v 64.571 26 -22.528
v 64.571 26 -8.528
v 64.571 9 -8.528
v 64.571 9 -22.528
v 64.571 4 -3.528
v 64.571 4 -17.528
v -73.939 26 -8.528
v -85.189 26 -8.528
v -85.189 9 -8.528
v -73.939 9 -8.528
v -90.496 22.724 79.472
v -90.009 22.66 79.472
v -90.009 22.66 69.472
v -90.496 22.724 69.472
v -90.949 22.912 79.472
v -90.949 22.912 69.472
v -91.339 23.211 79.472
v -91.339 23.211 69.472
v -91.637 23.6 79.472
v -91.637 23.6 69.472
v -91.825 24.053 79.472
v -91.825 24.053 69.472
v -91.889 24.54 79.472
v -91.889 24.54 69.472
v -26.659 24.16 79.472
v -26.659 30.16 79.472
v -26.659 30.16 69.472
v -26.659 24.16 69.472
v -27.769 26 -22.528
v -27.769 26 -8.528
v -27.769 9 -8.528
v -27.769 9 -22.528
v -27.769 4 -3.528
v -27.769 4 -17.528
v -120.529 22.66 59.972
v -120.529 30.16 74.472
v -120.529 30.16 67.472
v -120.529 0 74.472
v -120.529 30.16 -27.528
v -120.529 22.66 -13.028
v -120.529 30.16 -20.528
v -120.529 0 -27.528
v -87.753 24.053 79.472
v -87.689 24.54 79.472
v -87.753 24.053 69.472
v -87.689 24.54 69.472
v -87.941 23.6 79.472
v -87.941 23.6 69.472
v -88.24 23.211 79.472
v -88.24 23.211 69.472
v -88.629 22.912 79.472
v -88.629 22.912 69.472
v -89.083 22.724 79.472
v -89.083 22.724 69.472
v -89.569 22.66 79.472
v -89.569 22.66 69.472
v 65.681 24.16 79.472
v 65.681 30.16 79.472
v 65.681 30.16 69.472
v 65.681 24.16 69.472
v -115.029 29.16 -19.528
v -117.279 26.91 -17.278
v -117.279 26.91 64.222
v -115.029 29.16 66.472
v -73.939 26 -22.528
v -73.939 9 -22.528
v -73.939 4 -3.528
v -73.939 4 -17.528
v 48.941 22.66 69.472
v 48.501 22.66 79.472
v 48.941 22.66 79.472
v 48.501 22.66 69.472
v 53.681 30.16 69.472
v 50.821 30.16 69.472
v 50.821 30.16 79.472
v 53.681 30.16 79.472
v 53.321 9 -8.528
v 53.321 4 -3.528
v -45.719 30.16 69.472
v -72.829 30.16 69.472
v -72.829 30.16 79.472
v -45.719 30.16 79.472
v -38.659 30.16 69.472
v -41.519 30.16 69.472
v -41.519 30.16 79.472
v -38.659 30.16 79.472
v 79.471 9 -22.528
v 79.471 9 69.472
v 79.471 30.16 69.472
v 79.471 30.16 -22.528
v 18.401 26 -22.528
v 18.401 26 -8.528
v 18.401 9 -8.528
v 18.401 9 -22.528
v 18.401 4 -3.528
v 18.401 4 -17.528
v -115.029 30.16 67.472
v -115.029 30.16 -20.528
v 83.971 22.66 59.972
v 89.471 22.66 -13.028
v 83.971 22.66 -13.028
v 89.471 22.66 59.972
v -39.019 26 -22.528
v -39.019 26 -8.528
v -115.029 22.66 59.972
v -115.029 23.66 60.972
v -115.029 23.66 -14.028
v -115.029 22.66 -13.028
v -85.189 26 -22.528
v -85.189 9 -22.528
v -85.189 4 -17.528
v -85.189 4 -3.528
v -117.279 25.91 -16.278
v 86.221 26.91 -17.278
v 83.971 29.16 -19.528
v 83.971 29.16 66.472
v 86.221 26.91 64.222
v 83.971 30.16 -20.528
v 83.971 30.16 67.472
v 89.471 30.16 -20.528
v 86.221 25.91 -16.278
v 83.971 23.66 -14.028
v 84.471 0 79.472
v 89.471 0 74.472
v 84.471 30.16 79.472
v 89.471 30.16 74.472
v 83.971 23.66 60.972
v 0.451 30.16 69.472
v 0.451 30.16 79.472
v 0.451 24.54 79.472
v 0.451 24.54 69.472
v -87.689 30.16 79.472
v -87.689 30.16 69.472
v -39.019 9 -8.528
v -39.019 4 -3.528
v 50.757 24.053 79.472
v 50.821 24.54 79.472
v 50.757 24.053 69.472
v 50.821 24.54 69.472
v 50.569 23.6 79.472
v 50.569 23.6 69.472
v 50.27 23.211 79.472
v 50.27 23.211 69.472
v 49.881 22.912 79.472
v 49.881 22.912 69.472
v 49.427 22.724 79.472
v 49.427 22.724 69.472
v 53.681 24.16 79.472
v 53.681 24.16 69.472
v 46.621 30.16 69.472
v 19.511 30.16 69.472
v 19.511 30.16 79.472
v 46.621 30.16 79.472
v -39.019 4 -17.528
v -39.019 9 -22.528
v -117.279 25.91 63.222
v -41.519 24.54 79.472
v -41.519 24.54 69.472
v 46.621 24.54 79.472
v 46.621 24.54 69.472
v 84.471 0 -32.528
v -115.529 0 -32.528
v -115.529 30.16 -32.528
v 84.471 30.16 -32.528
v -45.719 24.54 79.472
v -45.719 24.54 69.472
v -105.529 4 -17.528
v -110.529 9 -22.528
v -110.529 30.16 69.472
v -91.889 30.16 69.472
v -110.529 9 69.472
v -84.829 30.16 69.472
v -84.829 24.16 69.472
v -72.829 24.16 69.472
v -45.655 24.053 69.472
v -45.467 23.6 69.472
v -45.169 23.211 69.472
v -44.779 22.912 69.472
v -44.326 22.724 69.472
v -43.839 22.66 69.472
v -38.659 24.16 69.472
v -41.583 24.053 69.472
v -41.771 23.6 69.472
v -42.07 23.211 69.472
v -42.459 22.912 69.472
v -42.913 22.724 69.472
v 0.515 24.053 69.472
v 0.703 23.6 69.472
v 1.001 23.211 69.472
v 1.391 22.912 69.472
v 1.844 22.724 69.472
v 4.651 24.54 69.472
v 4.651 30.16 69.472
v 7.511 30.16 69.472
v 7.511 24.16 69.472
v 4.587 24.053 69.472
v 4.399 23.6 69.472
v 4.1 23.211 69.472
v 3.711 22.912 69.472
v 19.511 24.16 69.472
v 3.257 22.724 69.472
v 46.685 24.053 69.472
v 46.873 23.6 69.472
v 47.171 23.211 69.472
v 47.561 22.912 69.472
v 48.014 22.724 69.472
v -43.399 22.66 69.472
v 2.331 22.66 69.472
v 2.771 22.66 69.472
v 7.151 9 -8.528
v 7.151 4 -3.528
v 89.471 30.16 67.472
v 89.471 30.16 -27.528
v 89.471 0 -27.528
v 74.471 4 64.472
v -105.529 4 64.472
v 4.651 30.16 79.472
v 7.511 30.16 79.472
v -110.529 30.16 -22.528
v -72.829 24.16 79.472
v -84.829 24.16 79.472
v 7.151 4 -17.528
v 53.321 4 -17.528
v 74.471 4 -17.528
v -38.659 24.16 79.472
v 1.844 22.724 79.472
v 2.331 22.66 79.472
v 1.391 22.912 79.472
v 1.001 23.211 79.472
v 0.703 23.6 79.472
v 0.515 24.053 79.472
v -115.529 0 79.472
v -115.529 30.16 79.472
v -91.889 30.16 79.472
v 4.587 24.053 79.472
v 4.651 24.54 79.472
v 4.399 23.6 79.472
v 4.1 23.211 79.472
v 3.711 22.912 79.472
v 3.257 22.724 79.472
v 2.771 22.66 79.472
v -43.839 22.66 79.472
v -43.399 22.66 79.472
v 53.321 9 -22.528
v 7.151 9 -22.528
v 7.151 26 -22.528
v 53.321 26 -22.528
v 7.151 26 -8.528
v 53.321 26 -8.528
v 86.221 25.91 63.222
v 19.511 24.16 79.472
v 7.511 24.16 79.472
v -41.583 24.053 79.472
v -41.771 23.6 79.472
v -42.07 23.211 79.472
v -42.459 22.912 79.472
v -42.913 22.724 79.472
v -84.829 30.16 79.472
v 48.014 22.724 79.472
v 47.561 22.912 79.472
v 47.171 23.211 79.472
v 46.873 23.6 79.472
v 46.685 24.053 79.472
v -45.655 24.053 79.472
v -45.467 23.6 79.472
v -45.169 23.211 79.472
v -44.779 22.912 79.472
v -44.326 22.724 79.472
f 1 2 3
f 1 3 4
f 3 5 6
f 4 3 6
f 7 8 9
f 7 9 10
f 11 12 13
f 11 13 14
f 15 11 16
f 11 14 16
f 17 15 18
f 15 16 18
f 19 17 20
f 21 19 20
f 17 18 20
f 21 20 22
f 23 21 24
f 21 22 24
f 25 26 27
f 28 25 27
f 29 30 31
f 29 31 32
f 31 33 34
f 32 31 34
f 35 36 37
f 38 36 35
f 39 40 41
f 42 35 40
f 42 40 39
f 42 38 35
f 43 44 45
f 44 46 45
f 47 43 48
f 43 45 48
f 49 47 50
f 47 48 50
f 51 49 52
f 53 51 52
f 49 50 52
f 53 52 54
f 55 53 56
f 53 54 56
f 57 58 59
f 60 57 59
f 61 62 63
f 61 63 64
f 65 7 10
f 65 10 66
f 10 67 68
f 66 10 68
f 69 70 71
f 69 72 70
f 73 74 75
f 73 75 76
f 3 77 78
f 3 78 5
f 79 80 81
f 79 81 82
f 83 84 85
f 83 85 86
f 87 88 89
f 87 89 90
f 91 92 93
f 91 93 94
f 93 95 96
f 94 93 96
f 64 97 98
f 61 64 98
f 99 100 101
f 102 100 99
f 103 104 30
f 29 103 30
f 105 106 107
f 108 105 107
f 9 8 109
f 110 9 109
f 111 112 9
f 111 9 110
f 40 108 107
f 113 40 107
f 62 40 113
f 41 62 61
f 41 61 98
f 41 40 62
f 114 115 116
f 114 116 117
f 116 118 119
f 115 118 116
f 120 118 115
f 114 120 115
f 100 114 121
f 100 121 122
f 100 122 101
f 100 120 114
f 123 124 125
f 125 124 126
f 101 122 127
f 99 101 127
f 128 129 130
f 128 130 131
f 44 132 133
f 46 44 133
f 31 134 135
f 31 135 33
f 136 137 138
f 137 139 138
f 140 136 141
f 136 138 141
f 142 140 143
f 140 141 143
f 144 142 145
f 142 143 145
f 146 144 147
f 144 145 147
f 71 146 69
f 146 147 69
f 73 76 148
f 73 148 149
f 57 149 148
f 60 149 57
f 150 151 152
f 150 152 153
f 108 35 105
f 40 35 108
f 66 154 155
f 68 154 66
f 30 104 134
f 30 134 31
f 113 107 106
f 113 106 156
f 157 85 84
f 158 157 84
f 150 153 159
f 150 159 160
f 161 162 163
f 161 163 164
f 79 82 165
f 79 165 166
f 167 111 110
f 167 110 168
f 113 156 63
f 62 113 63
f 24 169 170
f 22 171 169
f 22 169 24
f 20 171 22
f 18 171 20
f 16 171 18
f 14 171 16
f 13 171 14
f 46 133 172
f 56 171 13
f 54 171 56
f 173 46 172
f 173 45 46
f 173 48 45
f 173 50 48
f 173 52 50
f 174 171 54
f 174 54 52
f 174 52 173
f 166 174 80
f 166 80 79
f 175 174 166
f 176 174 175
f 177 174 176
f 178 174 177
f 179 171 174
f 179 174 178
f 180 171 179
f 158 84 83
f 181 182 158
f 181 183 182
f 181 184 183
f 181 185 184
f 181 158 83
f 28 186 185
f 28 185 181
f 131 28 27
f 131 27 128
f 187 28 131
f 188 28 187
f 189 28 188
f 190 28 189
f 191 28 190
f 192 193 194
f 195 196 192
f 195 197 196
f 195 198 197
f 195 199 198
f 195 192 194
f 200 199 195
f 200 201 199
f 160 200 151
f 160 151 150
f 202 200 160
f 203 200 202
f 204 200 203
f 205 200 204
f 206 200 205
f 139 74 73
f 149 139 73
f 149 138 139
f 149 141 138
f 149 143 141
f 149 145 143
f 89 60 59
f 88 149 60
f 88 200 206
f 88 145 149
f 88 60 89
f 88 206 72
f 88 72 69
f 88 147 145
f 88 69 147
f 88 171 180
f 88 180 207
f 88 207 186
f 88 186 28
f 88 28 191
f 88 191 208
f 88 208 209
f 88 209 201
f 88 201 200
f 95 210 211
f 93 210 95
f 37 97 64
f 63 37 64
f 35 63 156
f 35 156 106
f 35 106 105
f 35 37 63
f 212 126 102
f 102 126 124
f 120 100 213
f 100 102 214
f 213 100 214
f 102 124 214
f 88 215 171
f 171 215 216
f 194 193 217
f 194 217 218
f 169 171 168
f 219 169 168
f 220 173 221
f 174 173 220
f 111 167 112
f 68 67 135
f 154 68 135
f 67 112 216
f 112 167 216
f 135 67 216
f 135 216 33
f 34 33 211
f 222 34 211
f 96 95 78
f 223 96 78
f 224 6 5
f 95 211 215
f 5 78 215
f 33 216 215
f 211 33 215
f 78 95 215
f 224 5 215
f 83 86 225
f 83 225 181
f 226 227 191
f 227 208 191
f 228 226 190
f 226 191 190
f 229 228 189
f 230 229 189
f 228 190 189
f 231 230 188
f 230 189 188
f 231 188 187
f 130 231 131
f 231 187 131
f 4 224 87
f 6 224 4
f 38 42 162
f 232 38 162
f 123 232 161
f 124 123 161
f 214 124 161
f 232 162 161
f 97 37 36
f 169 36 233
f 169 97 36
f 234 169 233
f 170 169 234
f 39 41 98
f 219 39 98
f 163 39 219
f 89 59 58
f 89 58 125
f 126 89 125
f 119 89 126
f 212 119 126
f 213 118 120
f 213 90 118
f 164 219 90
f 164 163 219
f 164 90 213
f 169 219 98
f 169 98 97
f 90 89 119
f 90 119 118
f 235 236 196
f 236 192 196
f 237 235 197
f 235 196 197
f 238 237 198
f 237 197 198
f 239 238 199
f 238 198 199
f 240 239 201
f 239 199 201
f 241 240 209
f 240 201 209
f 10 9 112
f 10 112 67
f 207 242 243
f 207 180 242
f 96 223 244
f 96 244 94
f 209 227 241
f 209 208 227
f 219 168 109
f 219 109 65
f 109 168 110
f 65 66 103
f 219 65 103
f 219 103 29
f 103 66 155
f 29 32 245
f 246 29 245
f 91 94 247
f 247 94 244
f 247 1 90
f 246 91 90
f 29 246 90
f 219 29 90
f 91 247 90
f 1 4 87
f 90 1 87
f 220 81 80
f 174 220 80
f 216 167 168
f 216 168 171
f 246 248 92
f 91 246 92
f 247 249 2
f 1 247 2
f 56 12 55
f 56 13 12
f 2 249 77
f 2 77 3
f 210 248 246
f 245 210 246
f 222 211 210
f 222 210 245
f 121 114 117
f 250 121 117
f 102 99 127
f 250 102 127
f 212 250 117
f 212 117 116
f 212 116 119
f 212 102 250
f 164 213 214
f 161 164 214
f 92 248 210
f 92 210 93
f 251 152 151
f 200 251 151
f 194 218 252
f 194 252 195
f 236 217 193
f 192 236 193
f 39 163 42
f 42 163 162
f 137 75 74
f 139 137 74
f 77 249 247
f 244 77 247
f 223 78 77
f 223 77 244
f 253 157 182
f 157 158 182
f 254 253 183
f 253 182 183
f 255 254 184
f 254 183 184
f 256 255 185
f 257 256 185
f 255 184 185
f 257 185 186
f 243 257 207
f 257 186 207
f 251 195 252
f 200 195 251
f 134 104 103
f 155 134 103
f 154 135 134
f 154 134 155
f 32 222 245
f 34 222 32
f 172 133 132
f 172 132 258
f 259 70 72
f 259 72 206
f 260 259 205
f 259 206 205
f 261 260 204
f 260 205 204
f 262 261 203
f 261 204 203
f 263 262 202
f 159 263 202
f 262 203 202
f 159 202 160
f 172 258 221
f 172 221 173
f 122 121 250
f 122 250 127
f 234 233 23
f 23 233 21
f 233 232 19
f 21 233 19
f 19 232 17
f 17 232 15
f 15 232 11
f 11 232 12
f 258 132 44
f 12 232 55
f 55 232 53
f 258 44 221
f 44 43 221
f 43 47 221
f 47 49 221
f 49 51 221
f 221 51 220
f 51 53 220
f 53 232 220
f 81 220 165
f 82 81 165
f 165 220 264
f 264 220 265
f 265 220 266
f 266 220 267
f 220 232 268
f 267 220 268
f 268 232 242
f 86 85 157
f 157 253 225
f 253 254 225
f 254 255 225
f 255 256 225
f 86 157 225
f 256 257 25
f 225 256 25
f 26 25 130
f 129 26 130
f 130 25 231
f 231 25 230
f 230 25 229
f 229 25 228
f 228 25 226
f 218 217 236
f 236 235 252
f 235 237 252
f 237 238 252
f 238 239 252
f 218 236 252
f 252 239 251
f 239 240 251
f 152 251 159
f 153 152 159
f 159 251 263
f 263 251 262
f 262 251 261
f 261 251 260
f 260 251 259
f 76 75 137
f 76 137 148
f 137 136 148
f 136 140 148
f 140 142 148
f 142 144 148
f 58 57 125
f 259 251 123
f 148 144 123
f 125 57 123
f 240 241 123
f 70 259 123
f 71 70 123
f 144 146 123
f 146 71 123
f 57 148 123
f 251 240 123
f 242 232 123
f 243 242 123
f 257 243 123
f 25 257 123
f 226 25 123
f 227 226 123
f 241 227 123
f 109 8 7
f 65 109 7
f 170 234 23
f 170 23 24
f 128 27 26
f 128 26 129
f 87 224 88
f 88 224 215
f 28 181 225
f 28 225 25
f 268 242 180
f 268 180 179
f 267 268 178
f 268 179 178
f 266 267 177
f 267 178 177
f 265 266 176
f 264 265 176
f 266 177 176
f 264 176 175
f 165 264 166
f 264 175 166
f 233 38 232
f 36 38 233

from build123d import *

# Parameters (mm, degrees)
SKETCH2_W           = 210
SKETCH2_H           = 112
SKETCH2_W_2         = 190
SKETCH2_H_2         = 92
BOSS_EXTRUDE1_DEPTH = 30.16
SKETCH3_W           = 210
SKETCH3_H           = 112
BOSS_EXTRUDE2_DEPTH = 4
SKETCH4_W           = 11.25
SKETCH4_H           = 13.999999996
BOSS_EXTRUDE3_DEPTH = 22
SKETCH5_W           = 12
SKETCH5_H           = 10
CUT_EXTRUDE1_DEPTH  = 6
CHAMFER2_SIZE       = 5
CUT_EXTRUDE2_DEPTH  = 5.5
CUT_EXTRUDE3_DEPTH  = 5.5
SKETCH9_W           = 4.2
SKETCH9_H           = 10
CUT_EXTRUDE4_DEPTH  = 7.5
FILLET1_R           = 1.88
CHAMFER3_SIZE       = 5
CHAMFER4_SIZE       = 5
BOSS_EXTRUDE4_START = -10
BOSS_EXTRUDE4_DEPTH = 90


with BuildPart() as part:
    # Sketch2 → Boss-Extrude1 (new body)
    with BuildSketch(Plane(origin=(0, 0, 0), x_dir=(1, 0, 0), z_dir=(0, 1, 0))):
        with Locations((-15.529354961, -23.471700962)):
            Rectangle(SKETCH2_W, SKETCH2_H)
        with Locations((-15.529354961, -23.471700962)):
            Rectangle(SKETCH2_W_2, SKETCH2_H_2, mode=Mode.SUBTRACT)
    extrude(amount=BOSS_EXTRUDE1_DEPTH)



with BuildPart() as body_2:
    # Sketch3 → Boss-Extrude2 (new body)
    with BuildSketch(Plane.XZ):
        with Locations((-15.529354961, 23.471700962)):
            Rectangle(SKETCH3_W, SKETCH3_H)
    extrude(amount=-BOSS_EXTRUDE2_DEPTH)


with BuildPart() as part_1:
    add(part.part)

    add(body_2.part)  # Boss-Extrude3 merges body 2
    # Sketch4 → Boss-Extrude3 (add)
    with BuildSketch(Plane(origin=(0, 4, 0), x_dir=(1, 0, 0), z_dir=(0, 1, 0))):
        with Locations((-79.564354961, 15.52829904)):
            Rectangle(SKETCH4_W, SKETCH4_H)
        with Locations((-33.394354961, 15.52829904)):
            Rectangle(SKETCH4_W, SKETCH4_H)
        with Locations((12.775645039, 15.52829904)):
            Rectangle(SKETCH4_W, SKETCH4_H)
        with Locations((58.945645039, 15.52829904)):
            Rectangle(SKETCH4_W, SKETCH4_H)
    extrude(amount=BOSS_EXTRUDE3_DEPTH)

    # Sketch5 → Cut-Extrude1 (cut)
    with BuildSketch(Plane(origin=(0, 30.16, 0), x_dir=(1, 0, 0), z_dir=(0, 1, 0))):
        with Locations((-78.829354961, -74.471700962)):
            Rectangle(SKETCH5_W, SKETCH5_H)
        with Locations((-32.659354961, -74.471700962)):
            Rectangle(SKETCH5_W, SKETCH5_H)
        with Locations((13.510645039, -74.471700962)):
            Rectangle(SKETCH5_W, SKETCH5_H)
        with Locations((59.680645039, -74.471700962)):
            Rectangle(SKETCH5_W, SKETCH5_H)
    extrude(amount=-CUT_EXTRUDE1_DEPTH, mode=Mode.SUBTRACT)

    # Chamfer2
    chamfer2_edges = [part_1.edges().sort_by_distance(p)[0] for p in [
        (-110.529354961, 4, 23.471700962),
        (-97.859354961, 4, -22.528299038),
        (-56.479354961, 4, -22.528299038),
        (79.470645039, 4, 23.471700962),
        (-15.529354961, 4, 69.471700962),
        (-10.309354961, 4, -22.528299038),
        (35.860645039, 4, -22.528299038),
        (72.020645039, 4, -22.528299038),
    ]]
    chamfer(chamfer2_edges, length=CHAMFER2_SIZE)

    # Sketch6 → Cut-Extrude2 (cut)
    with BuildSketch(Plane.ZY.offset(120.529354961)):
        Polygon((-20.528299038, 30.16), (67.471700962, 30.16), (59.971700962, 22.66), (-13.028299038, 22.66), align=None)
    extrude(amount=-CUT_EXTRUDE2_DEPTH, mode=Mode.SUBTRACT)

    # Sketch8 → Cut-Extrude3 (cut)
    with BuildSketch(Plane(origin=(89.470645039, 0, 0), x_dir=(0, 0, -1), z_dir=(1, 0, 0))):
        Polygon((20.528299038, 30.16), (13.028299038, 22.66), (-59.971700962, 22.66), (-67.471700962, 30.16), align=None)
    extrude(amount=-CUT_EXTRUDE3_DEPTH, mode=Mode.SUBTRACT)

    # Sketch9 → Cut-Extrude4 (cut)
    with BuildSketch(Plane(origin=(0, 30.16, 0), x_dir=(1, 0, 0), z_dir=(0, 1, 0))):
        with Locations((-89.789354961, -74.471700962)):
            Rectangle(SKETCH9_W, SKETCH9_H)
        with Locations((48.720645039, -74.471700962)):
            Rectangle(SKETCH9_W, SKETCH9_H)
        with Locations((2.550645039, -74.471700962)):
            Rectangle(SKETCH9_W, SKETCH9_H)
        with Locations((-43.619354961, -74.471700962)):
            Rectangle(SKETCH9_W, SKETCH9_H)
    extrude(amount=-CUT_EXTRUDE4_DEPTH, mode=Mode.SUBTRACT)

    # Fillet1
    fillet1_edges = [part_1.edges().sort_by_distance(p)[0] for p in [
        (-87.689354961, 22.66, 74.471700962),
        (-91.889354961, 22.66, 74.471700962),
        (50.820645039, 22.66, 74.471700962),
        (46.620645039, 22.66, 74.471700962),
        (4.650645039, 22.66, 74.471700962),
        (0.450645039, 22.66, 74.471700962),
        (-41.519354961, 22.66, 74.471700962),
        (-45.719354961, 22.66, 74.471700962),
    ]]
    fillet(fillet1_edges, radius=FILLET1_R)

    # Chamfer3
    chamfer3_edges = [part_1.edges().sort_by_distance(p)[0] for p in [
        (-79.564354961, 4, -8.528299042),
        (-33.394354961, 4, -8.528299042),
        (12.775645039, 4, -8.528299042),
        (58.945645039, 4, -8.528299042),
    ]]
    chamfer(chamfer3_edges, length=CHAMFER3_SIZE)

    # Chamfer4
    chamfer4_edges = [part_1.edges().sort_by_distance(p)[0] for p in [
        (89.470645039, 15.08, 79.471700962),
        (-120.529354961, 15.08, 79.471700962),
        (-120.529354961, 15.08, -32.528299038),
        (89.470645039, 15.08, -32.528299038),
    ]]
    chamfer(chamfer4_edges, length=CHAMFER4_SIZE)

    # Sketch10 → Boss-Extrude4 (add)
    with BuildSketch(Plane.XY.offset(79.471700962).offset(BOSS_EXTRUDE4_START)):
        Polygon((83.970645039, 29.16), (86.220645039, 26.91), (86.220645039, 25.91), (83.970645039, 23.66), align=None)
        Polygon((-115.029354961, 29.16), (-115.029354961, 23.66), (-117.279354961, 25.91), (-117.279354961, 26.91), align=None)
    extrude(amount=-BOSS_EXTRUDE4_DEPTH)


solid = part_1.part
